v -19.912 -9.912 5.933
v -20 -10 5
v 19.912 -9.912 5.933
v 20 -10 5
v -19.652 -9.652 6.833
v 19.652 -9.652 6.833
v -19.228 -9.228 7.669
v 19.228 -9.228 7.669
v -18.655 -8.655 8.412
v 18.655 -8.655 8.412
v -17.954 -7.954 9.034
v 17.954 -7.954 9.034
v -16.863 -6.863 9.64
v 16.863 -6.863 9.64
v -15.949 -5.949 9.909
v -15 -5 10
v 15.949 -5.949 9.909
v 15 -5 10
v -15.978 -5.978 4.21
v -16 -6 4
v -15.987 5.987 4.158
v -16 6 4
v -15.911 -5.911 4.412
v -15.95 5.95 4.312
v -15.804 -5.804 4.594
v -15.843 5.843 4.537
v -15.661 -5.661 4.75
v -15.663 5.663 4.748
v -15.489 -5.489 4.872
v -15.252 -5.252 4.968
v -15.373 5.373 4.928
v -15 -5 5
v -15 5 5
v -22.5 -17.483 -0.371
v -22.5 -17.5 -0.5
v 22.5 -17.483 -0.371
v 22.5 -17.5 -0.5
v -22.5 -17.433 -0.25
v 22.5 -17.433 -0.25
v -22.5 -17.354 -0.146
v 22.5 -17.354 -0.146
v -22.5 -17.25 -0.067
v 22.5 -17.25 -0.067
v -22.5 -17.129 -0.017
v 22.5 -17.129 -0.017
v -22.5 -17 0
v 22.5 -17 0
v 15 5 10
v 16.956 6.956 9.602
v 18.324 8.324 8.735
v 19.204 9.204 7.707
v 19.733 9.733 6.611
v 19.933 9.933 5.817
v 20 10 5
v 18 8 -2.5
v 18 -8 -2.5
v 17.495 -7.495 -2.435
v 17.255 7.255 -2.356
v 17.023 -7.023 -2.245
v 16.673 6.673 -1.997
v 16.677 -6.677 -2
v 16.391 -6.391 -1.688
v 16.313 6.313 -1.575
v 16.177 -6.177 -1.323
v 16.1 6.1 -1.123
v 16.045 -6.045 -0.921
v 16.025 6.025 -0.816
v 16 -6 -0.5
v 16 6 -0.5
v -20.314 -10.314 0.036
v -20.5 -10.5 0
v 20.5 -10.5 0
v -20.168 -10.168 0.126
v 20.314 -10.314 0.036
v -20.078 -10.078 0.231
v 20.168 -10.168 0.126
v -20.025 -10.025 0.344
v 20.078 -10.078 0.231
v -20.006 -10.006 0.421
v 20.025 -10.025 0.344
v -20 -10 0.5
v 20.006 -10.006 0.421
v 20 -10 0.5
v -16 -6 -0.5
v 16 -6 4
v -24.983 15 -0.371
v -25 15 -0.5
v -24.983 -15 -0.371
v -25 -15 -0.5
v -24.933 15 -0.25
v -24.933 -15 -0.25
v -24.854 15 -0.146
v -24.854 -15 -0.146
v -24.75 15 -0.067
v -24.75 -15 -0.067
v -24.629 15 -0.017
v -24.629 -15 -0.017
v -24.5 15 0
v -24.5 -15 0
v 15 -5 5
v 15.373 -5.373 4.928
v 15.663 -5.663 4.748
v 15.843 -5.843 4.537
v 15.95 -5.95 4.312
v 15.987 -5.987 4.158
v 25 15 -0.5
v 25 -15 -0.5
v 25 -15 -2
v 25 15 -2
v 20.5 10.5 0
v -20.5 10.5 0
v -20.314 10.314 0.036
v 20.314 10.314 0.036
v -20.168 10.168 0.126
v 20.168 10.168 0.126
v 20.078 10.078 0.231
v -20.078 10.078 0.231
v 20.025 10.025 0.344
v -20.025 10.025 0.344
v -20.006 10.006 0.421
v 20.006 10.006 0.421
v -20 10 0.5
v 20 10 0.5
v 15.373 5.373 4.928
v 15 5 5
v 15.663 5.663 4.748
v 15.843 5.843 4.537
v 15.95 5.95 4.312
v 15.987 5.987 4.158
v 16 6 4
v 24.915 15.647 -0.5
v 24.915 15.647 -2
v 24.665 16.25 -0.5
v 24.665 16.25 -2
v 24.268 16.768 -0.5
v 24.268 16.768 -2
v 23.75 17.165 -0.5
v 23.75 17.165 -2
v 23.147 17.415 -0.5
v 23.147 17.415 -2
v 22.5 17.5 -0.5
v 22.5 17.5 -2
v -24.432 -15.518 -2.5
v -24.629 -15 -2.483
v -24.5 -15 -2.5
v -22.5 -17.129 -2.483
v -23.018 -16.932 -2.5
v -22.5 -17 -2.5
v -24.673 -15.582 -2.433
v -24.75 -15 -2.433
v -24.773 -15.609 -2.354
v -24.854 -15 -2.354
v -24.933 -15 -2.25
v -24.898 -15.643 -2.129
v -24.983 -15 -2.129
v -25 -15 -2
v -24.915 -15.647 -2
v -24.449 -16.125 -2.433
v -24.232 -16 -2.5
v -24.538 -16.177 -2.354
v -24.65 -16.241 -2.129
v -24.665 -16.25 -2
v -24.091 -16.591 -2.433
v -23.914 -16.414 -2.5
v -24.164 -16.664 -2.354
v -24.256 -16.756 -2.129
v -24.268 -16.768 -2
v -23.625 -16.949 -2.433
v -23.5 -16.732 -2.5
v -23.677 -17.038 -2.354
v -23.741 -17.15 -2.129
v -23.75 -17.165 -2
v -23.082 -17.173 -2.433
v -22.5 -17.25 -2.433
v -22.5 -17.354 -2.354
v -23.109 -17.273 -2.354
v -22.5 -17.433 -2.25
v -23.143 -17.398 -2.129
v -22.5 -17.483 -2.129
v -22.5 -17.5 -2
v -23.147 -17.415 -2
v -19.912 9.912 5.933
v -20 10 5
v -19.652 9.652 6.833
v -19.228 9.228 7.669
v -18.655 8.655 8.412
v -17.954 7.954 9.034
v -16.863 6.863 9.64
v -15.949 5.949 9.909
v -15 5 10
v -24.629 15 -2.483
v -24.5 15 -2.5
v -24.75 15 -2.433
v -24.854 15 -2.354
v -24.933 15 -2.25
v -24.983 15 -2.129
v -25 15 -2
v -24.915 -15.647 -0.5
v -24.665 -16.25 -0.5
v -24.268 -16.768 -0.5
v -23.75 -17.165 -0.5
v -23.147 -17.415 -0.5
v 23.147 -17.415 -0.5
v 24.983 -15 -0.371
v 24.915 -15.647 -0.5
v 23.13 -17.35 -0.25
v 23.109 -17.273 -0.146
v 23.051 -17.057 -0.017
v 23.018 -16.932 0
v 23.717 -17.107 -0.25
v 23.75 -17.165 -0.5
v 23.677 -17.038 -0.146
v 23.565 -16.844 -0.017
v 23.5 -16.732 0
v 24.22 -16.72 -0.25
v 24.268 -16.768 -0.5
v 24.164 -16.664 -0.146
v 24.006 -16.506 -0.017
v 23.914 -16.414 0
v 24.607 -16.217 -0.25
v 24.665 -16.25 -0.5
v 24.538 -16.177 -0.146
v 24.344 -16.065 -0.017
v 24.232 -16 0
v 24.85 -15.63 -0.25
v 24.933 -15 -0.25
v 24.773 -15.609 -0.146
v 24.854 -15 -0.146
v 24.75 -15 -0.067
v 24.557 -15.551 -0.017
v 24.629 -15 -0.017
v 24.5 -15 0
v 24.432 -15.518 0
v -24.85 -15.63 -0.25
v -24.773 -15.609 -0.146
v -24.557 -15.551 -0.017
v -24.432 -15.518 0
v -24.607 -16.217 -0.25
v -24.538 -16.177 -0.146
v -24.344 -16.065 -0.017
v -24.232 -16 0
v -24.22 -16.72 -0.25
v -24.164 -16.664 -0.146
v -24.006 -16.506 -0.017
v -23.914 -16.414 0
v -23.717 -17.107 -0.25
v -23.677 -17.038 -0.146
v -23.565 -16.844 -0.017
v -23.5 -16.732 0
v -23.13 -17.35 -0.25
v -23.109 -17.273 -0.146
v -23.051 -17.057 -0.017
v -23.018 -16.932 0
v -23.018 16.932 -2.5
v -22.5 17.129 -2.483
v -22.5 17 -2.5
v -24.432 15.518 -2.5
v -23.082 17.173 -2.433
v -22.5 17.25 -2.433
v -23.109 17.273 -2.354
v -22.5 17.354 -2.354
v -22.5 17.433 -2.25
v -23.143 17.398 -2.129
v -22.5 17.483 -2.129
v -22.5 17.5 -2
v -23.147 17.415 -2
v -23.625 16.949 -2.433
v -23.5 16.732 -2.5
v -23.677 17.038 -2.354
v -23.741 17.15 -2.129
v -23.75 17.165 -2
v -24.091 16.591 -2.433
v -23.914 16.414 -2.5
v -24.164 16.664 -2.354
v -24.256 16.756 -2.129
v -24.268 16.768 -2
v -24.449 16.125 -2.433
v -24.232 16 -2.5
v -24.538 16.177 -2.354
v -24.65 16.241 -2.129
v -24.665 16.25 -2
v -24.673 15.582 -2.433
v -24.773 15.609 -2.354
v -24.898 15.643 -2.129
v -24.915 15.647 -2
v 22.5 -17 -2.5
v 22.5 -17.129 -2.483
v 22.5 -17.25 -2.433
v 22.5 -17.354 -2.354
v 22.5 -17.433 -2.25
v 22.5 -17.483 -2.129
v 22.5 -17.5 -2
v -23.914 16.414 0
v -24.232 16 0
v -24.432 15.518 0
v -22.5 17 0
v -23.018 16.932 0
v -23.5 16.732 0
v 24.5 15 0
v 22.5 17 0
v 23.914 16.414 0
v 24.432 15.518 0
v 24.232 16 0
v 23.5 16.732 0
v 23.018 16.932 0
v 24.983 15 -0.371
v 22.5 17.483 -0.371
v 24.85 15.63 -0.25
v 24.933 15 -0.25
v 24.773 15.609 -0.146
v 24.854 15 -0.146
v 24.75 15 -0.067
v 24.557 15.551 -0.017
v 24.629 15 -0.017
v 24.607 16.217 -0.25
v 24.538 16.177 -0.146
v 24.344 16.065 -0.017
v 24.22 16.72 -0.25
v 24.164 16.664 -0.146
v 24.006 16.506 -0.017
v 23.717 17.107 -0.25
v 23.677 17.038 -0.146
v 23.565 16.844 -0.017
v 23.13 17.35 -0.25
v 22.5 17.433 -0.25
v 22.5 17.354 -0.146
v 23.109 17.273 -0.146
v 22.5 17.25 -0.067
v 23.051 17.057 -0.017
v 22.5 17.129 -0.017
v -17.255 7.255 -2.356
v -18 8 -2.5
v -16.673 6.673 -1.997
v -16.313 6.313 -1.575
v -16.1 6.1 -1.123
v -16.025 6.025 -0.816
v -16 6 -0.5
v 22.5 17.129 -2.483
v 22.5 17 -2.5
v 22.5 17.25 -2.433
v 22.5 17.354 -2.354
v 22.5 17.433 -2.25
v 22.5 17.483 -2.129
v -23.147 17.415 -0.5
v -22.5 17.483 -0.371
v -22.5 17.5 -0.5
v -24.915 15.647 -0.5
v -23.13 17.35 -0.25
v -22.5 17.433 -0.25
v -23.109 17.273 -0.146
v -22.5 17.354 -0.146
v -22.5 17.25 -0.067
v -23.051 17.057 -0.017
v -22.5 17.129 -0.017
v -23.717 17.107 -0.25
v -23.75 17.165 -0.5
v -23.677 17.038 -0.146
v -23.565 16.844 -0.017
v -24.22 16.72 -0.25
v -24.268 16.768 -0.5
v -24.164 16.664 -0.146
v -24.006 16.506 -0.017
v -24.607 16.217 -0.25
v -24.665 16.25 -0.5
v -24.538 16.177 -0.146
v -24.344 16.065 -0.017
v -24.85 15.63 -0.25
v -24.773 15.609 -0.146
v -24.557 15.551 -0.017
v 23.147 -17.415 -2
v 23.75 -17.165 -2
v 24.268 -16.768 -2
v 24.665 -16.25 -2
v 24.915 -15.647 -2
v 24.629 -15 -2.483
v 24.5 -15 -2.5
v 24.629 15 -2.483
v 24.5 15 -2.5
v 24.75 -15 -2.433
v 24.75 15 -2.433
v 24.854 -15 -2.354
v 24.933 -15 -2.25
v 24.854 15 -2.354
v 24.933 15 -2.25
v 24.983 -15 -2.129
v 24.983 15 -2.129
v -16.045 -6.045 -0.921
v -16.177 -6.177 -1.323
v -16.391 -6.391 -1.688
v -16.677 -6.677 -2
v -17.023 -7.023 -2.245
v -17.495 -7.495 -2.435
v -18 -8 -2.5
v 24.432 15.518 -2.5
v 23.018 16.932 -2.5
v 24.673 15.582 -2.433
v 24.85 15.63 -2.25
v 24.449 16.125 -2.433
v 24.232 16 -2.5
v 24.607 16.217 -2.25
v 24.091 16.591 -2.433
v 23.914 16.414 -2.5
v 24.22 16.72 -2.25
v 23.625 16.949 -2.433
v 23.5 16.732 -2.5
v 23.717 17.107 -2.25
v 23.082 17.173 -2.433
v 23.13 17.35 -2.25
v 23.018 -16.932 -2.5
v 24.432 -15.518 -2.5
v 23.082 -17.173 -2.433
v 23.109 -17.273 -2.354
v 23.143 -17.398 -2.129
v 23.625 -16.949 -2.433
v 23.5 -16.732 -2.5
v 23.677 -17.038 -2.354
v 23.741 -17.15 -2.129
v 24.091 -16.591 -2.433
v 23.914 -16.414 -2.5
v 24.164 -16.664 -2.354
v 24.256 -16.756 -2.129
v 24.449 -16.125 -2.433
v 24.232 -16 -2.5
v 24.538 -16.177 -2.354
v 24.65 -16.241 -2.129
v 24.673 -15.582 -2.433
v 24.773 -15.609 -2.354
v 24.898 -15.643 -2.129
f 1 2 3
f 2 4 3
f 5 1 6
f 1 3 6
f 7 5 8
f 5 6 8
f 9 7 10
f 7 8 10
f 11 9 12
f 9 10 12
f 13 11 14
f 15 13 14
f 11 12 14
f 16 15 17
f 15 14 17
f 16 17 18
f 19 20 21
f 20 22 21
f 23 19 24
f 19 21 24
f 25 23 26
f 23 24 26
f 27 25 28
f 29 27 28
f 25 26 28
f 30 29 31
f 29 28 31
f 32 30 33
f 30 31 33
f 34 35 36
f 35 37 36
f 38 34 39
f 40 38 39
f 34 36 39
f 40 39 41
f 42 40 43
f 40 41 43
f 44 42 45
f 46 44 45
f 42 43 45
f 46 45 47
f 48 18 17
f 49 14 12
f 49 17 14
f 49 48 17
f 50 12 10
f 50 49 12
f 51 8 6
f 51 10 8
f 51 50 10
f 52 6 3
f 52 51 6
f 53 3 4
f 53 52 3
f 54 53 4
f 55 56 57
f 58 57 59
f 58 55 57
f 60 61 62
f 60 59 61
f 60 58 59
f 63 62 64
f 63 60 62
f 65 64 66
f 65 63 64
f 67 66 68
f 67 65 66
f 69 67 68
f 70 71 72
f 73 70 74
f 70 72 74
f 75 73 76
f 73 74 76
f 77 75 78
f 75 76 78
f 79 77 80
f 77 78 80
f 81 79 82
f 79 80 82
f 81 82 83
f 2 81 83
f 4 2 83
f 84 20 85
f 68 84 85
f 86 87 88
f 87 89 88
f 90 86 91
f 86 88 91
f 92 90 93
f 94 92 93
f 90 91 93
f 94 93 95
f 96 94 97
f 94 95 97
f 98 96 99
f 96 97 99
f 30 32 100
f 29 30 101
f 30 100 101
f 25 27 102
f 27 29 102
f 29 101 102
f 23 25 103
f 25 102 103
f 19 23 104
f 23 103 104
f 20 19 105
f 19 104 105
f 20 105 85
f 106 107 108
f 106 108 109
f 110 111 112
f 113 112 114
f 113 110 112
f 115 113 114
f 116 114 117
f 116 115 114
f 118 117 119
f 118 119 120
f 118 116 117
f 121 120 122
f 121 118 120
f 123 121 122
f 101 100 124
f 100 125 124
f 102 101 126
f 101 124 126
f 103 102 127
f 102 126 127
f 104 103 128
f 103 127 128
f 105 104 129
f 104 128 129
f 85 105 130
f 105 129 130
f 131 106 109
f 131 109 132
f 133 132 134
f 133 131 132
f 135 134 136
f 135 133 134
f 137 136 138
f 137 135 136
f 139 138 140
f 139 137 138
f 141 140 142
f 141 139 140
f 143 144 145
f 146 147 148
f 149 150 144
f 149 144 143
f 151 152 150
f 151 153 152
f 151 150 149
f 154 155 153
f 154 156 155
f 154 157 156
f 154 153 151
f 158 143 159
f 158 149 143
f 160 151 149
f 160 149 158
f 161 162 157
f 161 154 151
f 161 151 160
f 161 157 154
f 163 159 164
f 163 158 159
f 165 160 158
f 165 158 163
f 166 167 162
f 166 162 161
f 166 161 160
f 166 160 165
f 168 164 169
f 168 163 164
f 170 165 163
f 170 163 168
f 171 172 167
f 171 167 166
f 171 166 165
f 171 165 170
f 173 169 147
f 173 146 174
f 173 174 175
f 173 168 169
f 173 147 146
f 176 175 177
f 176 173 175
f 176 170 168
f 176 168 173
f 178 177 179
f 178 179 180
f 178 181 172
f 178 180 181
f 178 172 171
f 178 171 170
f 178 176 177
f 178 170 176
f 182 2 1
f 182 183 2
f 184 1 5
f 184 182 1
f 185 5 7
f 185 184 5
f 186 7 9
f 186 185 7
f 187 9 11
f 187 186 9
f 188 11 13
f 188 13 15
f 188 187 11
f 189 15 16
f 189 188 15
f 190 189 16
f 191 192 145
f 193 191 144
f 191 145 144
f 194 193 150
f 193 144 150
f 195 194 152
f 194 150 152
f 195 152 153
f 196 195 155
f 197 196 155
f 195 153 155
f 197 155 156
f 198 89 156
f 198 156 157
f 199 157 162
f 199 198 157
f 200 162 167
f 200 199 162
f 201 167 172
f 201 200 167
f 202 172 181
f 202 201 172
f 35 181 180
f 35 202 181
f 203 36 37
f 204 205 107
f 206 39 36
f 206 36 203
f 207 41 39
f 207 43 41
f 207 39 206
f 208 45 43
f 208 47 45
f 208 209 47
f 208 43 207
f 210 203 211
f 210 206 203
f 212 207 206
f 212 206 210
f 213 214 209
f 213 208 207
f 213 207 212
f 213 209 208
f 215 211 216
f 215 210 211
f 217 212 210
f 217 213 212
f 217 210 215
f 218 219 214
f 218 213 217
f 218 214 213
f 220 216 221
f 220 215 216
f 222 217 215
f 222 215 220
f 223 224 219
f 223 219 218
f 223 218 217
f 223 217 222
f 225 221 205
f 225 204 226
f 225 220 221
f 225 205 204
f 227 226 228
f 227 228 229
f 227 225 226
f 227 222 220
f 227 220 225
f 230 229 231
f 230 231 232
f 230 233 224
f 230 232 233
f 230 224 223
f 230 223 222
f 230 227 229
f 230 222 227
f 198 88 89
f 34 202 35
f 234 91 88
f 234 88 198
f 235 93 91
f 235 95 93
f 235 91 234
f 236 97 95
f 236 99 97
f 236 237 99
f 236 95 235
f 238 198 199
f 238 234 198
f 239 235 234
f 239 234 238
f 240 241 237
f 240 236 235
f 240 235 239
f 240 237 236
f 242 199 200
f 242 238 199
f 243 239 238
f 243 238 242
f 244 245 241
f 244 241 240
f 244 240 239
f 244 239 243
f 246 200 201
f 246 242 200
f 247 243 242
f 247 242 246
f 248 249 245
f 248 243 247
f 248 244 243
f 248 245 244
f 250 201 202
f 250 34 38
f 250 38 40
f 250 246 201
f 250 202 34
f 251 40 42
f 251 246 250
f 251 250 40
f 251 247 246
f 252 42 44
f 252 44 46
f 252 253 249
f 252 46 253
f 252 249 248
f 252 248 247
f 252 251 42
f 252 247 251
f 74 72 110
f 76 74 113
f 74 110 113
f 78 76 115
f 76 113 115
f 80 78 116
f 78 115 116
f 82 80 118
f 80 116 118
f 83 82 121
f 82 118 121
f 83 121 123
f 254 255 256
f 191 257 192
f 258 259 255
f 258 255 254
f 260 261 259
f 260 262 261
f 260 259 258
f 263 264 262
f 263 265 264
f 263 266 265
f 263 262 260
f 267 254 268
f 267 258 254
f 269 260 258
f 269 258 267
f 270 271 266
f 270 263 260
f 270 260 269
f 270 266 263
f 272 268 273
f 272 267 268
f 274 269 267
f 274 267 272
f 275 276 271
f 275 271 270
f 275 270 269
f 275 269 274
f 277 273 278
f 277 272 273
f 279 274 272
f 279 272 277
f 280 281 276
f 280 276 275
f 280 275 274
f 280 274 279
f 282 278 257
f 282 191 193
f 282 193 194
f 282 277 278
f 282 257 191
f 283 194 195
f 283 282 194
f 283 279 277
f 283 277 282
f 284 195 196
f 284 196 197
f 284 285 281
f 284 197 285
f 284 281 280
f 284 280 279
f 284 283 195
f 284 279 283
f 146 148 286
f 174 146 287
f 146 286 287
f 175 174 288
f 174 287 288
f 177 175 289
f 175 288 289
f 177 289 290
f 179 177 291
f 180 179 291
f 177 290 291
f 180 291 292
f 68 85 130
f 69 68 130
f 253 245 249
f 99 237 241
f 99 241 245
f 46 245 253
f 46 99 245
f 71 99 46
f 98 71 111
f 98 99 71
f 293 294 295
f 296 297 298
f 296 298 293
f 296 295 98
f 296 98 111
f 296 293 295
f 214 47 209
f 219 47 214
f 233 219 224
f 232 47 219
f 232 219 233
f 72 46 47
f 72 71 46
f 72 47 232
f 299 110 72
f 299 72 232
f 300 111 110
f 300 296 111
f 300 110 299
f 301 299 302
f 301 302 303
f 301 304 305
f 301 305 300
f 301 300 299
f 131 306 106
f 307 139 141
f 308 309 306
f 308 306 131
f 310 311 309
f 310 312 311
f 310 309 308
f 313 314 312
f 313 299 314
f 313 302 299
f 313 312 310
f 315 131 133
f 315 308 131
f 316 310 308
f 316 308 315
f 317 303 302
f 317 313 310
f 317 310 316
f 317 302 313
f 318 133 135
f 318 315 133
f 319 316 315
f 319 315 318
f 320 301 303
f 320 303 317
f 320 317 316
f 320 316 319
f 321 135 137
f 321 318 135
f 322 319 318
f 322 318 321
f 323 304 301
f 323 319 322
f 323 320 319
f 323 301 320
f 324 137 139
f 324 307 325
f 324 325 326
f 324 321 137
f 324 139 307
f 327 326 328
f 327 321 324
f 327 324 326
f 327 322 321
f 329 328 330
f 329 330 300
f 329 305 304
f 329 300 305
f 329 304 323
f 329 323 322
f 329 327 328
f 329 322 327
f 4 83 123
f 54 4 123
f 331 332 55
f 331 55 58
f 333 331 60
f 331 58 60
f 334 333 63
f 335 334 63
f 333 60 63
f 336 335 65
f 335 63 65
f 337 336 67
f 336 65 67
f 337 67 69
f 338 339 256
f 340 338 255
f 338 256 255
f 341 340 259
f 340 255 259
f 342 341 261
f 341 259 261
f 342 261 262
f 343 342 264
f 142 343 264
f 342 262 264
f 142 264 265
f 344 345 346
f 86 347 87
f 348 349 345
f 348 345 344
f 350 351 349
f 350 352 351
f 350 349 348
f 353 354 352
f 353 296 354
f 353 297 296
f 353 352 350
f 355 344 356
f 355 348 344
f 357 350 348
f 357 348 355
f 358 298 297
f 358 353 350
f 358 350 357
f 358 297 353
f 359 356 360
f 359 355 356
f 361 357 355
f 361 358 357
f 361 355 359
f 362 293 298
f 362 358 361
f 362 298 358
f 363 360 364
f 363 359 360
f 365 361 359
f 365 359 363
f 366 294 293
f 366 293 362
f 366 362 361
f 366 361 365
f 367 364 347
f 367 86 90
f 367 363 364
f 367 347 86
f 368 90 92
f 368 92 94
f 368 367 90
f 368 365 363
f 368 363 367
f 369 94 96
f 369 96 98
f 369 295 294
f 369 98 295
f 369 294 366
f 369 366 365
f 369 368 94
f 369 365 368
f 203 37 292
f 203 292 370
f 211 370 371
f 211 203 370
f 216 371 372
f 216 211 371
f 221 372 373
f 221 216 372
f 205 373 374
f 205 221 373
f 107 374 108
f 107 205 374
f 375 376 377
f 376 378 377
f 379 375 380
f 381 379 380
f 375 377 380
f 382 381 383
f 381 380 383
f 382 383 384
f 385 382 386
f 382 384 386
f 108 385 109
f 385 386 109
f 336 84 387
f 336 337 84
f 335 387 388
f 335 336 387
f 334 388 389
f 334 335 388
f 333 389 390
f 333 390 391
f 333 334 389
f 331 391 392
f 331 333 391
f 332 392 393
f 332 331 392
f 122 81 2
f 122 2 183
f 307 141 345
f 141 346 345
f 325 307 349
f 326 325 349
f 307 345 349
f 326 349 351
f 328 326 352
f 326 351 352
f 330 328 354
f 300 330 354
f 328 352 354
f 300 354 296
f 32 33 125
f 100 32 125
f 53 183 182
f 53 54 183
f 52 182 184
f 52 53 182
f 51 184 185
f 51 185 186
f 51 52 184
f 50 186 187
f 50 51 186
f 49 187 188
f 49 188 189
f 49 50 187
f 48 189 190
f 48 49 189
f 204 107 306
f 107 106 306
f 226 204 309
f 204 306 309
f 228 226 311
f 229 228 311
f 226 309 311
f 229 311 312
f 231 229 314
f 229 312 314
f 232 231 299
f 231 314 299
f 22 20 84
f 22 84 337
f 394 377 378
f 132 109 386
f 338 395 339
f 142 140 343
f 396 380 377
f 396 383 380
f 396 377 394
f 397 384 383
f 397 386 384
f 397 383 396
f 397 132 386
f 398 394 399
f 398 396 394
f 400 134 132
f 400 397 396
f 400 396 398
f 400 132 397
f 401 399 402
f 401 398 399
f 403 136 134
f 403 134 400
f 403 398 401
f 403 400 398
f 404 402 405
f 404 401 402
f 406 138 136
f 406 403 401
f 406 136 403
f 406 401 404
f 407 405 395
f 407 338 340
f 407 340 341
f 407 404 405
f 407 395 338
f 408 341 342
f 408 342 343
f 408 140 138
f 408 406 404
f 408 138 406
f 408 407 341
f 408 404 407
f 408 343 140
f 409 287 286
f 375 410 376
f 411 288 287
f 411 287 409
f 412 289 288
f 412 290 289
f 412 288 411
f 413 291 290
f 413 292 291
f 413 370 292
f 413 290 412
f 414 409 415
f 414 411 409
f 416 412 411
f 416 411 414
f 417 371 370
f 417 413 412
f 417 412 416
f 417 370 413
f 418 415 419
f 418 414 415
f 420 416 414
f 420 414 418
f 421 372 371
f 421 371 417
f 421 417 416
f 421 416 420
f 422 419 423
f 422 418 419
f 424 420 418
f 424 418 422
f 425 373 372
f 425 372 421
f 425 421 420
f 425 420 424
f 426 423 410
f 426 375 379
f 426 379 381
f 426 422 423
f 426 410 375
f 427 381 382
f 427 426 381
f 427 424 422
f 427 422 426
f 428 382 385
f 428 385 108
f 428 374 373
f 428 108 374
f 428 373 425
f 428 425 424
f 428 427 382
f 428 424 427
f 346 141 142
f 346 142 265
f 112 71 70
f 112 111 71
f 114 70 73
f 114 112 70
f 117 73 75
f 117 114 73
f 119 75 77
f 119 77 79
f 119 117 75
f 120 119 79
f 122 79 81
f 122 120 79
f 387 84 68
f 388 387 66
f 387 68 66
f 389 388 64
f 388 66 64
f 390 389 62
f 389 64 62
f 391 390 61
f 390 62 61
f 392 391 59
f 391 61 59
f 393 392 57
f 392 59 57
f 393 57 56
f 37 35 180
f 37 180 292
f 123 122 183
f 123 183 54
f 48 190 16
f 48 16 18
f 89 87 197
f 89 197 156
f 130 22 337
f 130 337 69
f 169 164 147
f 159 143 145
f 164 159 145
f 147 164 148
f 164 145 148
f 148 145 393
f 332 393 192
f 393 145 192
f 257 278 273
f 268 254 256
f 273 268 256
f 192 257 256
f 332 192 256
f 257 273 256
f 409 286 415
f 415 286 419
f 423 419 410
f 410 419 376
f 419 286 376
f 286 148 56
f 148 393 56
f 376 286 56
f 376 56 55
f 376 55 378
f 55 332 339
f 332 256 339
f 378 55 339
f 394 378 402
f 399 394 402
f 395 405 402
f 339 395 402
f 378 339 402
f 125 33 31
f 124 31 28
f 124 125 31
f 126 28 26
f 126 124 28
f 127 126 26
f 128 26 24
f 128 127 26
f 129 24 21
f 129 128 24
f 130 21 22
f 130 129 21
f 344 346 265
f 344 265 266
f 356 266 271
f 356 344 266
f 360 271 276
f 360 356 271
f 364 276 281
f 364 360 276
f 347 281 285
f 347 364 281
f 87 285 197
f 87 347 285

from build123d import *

# Parameters (mm, degrees)
SKETCH1_W           = 40
SKETCH1_H           = 20
BOSS_EXTRUDE1_DEPTH = 10
SKETCH2_W           = 32
SKETCH2_H           = 12
CUT_EXTRUDE1_DEPTH  = 5
FILLET1_R           = 5
SKETCH3_W           = 32
SKETCH3_H           = 12
BOSS_EXTRUDE2_DEPTH = 2.5
FILLET2_R           = 1
FILLET3_R           = 2
SMOOTHINGFILLET_R   = 0.5


with BuildPart() as part:
    # Sketch1 → Boss-Extrude1 (new body)
    with BuildSketch(Plane.XY):
        Rectangle(SKETCH1_W, SKETCH1_H)
    extrude(amount=BOSS_EXTRUDE1_DEPTH)

    # Sketch2 → Cut-Extrude1 (cut)
    with BuildSketch(Plane.XY):
        Rectangle(SKETCH2_W, SKETCH2_H)
    extrude(amount=CUT_EXTRUDE1_DEPTH, mode=Mode.SUBTRACT)

    # Fillet1
    fillet1_edges = [part.edges().sort_by_distance(p)[0] for p in [
        (-20, 0, 10),
        (0, -10, 10),
        (20, 0, 10),
        (0, 10, 10),
    ]]
    fillet(fillet1_edges, radius=FILLET1_R)

    # Sketch3 → Boss-Extrude2 (add)
    with BuildSketch(Plane.XY):
        with BuildLine():
            Line((22.5, 17.5), (-22.5, 17.5))
            ThreePointArc((-22.5, 17.5), (-24.267766953, 16.767766953), (-25, 15))
            Line((-25, 15), (-25, -15))
            ThreePointArc((-25, -15), (-24.267766953, -16.767766953), (-22.5, -17.5))
            Line((-22.5, -17.5), (22.5, -17.5))
            ThreePointArc((22.5, -17.5), (24.267766953, -16.767766953), (25, -15))
            Line((25, -15), (25, 15))
            ThreePointArc((25, 15), (24.267766953, 16.767766953), (22.5, 17.5))
        make_face()
        Rectangle(SKETCH3_W, SKETCH3_H, mode=Mode.SUBTRACT)
    extrude(amount=-BOSS_EXTRUDE2_DEPTH)

    # Fillet2
    fillet2_edges = [part.edges().sort_by_distance(p)[0] for p in [
        (16, 0, 5),
        (0, 6, 5),
        (-16, 0, 5),
        (0, -6, 5),
    ]]
    fillet(fillet2_edges, radius=FILLET2_R)

    # Fillet3
    fillet3_edges = [part.edges().sort_by_distance(p)[0] for p in [
        (0, -6, -2.5),
        (16, 0, -2.5),
        (0, 6, -2.5),
        (-16, 0, -2.5),
    ]]
    fillet(fillet3_edges, radius=FILLET3_R)

    # SmoothingFillet
    smoothingfillet_edges = [part.edges().sort_by_distance(p)[0] for p in [
        (24.267766953, 16.767766953, 0),
        (0, 17.5, 0),
        (-24.267766953, 16.767766953, 0),
        (-25, 0, 0),
        (-24.267766953, -16.767766953, 0),
        (0, -17.5, 0),
        (24.267766953, -16.767766953, 0),
        (25, 0, 0),
        (24.267766953, 16.767766953, -2.5),
        (25, 0, -2.5),
        (24.267766953, -16.767766953, -2.5),
        (0, -17.5, -2.5),
        (-24.267766953, -16.767766953, -2.5),
        (-25, 0, -2.5),
        (-24.267766953, 16.767766953, -2.5),
        (0, 17.5, -2.5),
        (0, -10, 0),
        (-20, 0, 0),
        (0, 10, 0),
        (20, 0, 0),
    ]]
    fillet(smoothingfillet_edges, radius=SMOOTHINGFILLET_R)


solid = part.part
